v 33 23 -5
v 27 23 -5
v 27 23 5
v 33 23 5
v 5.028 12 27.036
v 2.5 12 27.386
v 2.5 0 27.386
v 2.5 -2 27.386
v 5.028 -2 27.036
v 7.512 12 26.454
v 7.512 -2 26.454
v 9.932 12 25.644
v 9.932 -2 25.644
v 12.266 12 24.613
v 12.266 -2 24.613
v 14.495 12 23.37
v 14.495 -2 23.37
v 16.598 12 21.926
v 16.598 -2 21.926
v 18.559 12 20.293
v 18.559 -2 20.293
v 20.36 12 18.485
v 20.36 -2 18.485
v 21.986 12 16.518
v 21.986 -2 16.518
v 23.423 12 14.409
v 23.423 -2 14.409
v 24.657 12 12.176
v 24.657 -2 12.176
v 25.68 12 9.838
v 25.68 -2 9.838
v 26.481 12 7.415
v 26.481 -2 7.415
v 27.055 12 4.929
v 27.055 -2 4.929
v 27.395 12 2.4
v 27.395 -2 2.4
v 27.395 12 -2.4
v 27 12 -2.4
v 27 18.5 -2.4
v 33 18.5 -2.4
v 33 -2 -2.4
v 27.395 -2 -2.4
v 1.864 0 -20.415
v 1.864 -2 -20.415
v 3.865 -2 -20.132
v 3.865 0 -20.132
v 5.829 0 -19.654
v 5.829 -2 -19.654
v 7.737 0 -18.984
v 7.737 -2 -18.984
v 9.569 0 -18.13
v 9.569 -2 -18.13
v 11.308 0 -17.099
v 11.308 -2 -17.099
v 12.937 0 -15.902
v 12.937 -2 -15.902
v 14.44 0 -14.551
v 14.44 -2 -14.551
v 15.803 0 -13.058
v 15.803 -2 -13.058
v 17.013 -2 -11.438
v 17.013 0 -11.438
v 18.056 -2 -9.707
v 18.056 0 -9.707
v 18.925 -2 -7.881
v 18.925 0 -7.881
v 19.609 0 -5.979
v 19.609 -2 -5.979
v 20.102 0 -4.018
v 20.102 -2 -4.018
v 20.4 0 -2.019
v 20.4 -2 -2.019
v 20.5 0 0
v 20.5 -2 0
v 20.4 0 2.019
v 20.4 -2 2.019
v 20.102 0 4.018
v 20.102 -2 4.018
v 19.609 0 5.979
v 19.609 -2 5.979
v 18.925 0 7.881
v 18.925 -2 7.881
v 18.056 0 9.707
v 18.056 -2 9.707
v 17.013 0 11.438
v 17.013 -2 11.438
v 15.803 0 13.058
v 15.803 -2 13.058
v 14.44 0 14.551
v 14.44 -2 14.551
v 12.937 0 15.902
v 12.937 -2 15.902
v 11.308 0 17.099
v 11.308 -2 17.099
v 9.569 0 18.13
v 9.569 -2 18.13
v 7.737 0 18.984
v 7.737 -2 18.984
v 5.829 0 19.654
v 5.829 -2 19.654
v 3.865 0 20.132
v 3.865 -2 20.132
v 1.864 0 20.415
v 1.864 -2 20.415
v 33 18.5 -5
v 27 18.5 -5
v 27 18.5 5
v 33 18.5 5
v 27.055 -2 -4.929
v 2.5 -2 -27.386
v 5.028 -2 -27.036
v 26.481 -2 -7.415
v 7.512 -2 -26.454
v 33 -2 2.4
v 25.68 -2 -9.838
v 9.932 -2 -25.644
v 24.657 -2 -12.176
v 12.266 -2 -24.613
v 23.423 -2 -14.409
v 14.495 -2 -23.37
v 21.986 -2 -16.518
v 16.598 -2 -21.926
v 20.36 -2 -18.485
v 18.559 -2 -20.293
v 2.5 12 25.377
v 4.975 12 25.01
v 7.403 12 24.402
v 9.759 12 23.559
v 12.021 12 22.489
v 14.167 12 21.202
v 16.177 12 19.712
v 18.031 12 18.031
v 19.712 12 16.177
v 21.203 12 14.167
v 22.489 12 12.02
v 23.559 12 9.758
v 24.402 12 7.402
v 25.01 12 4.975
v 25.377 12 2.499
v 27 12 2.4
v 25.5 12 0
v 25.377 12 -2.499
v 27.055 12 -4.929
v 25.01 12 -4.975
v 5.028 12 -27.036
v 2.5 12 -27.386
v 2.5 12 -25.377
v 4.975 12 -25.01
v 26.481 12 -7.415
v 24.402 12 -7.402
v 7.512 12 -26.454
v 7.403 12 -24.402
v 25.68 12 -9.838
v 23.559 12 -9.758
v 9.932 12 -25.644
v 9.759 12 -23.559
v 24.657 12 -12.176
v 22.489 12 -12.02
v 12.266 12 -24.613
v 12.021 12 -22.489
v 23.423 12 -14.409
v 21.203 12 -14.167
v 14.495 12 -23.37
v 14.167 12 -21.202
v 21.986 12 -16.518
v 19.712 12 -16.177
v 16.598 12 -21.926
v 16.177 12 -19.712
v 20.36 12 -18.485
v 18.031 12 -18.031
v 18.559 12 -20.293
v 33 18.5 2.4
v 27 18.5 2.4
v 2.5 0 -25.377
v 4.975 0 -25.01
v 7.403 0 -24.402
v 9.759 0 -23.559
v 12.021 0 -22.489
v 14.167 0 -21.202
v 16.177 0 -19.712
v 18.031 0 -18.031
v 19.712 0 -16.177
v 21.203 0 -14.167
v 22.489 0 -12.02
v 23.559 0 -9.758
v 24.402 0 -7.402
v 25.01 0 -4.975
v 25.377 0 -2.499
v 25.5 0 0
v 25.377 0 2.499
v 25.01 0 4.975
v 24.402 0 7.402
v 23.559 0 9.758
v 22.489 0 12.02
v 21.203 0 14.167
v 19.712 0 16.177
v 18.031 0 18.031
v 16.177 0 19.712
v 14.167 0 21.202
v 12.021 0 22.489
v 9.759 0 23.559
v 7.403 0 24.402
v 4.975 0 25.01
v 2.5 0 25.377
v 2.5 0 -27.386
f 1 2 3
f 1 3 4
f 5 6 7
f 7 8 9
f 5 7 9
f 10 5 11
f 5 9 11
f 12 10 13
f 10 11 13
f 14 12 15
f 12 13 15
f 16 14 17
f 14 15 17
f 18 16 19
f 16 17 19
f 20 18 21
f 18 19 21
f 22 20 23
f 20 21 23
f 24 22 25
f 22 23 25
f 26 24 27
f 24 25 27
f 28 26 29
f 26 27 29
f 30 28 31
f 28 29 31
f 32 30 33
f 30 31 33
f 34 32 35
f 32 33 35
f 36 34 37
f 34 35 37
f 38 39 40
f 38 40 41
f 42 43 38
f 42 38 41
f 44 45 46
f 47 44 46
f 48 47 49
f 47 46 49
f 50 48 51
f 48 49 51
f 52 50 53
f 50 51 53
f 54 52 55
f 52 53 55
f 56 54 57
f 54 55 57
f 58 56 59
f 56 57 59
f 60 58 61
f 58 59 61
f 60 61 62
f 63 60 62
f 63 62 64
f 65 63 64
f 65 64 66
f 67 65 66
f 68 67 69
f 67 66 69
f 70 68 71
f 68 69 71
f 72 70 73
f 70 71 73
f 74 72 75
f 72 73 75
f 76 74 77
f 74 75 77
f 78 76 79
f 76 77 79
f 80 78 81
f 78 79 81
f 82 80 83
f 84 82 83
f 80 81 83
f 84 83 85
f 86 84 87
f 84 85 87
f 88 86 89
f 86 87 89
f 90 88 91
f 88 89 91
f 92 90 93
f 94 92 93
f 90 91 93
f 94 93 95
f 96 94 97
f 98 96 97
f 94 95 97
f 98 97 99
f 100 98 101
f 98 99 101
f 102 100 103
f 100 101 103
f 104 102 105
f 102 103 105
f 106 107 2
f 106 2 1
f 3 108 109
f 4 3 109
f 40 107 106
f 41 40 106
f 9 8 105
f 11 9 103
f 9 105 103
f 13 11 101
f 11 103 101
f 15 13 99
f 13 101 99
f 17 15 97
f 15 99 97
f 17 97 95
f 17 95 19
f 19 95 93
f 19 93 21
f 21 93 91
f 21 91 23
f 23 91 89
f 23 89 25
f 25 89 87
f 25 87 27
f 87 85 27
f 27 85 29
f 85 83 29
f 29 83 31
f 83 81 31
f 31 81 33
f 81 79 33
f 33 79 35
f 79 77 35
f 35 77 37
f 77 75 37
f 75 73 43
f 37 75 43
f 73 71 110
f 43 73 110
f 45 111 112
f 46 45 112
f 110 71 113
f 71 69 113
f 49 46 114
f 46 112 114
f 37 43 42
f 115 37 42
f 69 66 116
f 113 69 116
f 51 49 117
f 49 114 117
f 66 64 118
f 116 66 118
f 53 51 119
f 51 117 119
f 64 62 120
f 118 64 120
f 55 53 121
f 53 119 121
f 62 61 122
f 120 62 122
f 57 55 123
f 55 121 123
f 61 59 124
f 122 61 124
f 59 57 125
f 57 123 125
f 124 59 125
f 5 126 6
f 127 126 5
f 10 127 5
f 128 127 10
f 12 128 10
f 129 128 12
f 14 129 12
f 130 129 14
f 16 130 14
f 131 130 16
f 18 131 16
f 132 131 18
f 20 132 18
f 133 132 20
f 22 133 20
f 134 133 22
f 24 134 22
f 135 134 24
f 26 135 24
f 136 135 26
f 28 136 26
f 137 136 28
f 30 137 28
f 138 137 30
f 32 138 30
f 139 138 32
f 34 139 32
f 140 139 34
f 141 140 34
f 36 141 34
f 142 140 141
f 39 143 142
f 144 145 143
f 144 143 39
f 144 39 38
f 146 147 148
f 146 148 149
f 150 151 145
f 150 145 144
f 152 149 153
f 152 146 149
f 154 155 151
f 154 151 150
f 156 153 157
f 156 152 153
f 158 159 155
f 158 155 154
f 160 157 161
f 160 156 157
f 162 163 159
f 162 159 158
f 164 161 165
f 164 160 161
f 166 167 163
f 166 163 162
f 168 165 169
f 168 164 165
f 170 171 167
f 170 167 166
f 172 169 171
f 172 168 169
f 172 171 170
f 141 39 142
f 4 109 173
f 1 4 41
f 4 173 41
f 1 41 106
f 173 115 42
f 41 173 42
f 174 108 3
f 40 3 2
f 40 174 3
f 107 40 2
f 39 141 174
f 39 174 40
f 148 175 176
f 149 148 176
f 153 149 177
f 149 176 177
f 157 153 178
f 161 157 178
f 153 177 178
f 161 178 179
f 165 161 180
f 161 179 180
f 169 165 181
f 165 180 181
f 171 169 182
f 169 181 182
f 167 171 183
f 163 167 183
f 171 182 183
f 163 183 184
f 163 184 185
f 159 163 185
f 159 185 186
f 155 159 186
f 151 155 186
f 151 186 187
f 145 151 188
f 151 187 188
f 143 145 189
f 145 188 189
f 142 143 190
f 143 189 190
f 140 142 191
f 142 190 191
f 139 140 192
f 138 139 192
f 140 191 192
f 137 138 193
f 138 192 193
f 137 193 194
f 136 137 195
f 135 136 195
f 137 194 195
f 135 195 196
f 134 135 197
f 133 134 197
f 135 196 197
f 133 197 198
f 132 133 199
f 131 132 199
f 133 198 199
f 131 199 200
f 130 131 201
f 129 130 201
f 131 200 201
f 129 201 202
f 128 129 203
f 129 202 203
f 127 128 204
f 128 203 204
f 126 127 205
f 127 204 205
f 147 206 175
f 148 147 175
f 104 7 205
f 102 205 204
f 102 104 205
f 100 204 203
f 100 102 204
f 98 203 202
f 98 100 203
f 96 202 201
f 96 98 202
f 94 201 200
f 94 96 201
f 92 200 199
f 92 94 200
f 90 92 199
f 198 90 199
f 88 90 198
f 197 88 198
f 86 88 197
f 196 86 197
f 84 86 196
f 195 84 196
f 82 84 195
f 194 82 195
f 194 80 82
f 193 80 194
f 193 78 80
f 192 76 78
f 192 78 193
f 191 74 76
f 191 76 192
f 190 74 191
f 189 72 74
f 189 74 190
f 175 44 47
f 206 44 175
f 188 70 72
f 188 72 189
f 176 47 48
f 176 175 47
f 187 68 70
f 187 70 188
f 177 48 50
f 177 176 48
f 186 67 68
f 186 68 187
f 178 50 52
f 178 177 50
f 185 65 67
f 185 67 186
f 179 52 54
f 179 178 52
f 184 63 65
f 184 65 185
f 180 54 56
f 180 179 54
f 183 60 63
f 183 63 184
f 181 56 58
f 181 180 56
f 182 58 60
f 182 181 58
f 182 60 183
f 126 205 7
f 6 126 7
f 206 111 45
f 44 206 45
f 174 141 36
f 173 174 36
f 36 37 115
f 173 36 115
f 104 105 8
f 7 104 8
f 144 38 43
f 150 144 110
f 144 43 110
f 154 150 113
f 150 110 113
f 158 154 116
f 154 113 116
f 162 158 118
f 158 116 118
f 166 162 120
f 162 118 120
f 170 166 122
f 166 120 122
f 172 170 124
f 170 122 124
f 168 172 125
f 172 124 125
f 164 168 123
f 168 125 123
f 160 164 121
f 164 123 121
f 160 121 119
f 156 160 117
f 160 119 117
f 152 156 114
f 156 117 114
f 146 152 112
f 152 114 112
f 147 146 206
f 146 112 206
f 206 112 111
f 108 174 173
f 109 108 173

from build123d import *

# Parameters (mm, degrees)
BOSS_EXTRUDE3_DEPTH      = 12
BOSS_EXTRUDE4_START      = -2
BOSS_EXTRUDE4_DEPTH      = 2
SKETCH3_W                = 6
SKETCH3_H                = 4.8
BOSS_EXTRUDE5_DEPTH      = 22
BOSS_EXTRUDE6_DEPTH      = 3
BOSS_EXTRUDE6_DEPTH_BACK = 1.5
SKETCH4_W                = 6
SKETCH4_H                = 10


with BuildPart() as part:
    # Sketch1 → Boss-Extrude3 (new body)
    with BuildSketch(Plane(origin=(0, 0, 0), x_dir=(1, 0, 0), z_dir=(0, 1, 0))):
        with BuildLine():
            Line((2.5, 27.386127875), (2.5, 25.377155081))
            ThreePointArc((2.5, 25.377155081), (25.5, 0), (2.5, -25.377155081))
            Line((2.5, -25.377155081), (2.5, -27.386127875))
            ThreePointArc((2.5, -27.386127875), (27.5, 0), (2.5, 27.386127875))
        make_face()
    extrude(amount=BOSS_EXTRUDE3_DEPTH)

    # Sketch2 → Boss-Extrude4 (add)
    with BuildSketch(Plane(origin=(0, 0, 0), x_dir=(1, 0, 0), z_dir=(0, 1, 0)).offset(BOSS_EXTRUDE4_START)):
        with BuildLine():
            Line((2.5, 27.386127875), (1.863636364, 20.415113507))
            ThreePointArc((1.863636364, 20.415113507), (20.5, 0), (1.863636364, -20.415113507))
            Line((1.863636364, -20.415113507), (2.5, -27.386127875))
            ThreePointArc((2.5, -27.386127875), (27.5, 0), (2.5, 27.386127875))
        make_face()
    extrude(amount=BOSS_EXTRUDE4_DEPTH)

    # Sketch3 → Boss-Extrude5 (add)
    with BuildSketch(Plane.XZ.offset(2)):
        with Locations((30, 0)):
            Rectangle(SKETCH3_W, SKETCH3_H)
    extrude(amount=-BOSS_EXTRUDE5_DEPTH)

    # Sketch4 → Boss-Extrude6 (add, two sides: drawn at the far end of the back side and taken through both)
    with BuildSketch(Plane(origin=(0, 20, 0), x_dir=(1, 0, 0), z_dir=(0, 1, 0)).offset(-BOSS_EXTRUDE6_DEPTH_BACK)):
        with Locations((30, 0)):
            Rectangle(SKETCH4_W, SKETCH4_H)
    extrude(amount=BOSS_EXTRUDE6_DEPTH + BOSS_EXTRUDE6_DEPTH_BACK)


solid = part.part
